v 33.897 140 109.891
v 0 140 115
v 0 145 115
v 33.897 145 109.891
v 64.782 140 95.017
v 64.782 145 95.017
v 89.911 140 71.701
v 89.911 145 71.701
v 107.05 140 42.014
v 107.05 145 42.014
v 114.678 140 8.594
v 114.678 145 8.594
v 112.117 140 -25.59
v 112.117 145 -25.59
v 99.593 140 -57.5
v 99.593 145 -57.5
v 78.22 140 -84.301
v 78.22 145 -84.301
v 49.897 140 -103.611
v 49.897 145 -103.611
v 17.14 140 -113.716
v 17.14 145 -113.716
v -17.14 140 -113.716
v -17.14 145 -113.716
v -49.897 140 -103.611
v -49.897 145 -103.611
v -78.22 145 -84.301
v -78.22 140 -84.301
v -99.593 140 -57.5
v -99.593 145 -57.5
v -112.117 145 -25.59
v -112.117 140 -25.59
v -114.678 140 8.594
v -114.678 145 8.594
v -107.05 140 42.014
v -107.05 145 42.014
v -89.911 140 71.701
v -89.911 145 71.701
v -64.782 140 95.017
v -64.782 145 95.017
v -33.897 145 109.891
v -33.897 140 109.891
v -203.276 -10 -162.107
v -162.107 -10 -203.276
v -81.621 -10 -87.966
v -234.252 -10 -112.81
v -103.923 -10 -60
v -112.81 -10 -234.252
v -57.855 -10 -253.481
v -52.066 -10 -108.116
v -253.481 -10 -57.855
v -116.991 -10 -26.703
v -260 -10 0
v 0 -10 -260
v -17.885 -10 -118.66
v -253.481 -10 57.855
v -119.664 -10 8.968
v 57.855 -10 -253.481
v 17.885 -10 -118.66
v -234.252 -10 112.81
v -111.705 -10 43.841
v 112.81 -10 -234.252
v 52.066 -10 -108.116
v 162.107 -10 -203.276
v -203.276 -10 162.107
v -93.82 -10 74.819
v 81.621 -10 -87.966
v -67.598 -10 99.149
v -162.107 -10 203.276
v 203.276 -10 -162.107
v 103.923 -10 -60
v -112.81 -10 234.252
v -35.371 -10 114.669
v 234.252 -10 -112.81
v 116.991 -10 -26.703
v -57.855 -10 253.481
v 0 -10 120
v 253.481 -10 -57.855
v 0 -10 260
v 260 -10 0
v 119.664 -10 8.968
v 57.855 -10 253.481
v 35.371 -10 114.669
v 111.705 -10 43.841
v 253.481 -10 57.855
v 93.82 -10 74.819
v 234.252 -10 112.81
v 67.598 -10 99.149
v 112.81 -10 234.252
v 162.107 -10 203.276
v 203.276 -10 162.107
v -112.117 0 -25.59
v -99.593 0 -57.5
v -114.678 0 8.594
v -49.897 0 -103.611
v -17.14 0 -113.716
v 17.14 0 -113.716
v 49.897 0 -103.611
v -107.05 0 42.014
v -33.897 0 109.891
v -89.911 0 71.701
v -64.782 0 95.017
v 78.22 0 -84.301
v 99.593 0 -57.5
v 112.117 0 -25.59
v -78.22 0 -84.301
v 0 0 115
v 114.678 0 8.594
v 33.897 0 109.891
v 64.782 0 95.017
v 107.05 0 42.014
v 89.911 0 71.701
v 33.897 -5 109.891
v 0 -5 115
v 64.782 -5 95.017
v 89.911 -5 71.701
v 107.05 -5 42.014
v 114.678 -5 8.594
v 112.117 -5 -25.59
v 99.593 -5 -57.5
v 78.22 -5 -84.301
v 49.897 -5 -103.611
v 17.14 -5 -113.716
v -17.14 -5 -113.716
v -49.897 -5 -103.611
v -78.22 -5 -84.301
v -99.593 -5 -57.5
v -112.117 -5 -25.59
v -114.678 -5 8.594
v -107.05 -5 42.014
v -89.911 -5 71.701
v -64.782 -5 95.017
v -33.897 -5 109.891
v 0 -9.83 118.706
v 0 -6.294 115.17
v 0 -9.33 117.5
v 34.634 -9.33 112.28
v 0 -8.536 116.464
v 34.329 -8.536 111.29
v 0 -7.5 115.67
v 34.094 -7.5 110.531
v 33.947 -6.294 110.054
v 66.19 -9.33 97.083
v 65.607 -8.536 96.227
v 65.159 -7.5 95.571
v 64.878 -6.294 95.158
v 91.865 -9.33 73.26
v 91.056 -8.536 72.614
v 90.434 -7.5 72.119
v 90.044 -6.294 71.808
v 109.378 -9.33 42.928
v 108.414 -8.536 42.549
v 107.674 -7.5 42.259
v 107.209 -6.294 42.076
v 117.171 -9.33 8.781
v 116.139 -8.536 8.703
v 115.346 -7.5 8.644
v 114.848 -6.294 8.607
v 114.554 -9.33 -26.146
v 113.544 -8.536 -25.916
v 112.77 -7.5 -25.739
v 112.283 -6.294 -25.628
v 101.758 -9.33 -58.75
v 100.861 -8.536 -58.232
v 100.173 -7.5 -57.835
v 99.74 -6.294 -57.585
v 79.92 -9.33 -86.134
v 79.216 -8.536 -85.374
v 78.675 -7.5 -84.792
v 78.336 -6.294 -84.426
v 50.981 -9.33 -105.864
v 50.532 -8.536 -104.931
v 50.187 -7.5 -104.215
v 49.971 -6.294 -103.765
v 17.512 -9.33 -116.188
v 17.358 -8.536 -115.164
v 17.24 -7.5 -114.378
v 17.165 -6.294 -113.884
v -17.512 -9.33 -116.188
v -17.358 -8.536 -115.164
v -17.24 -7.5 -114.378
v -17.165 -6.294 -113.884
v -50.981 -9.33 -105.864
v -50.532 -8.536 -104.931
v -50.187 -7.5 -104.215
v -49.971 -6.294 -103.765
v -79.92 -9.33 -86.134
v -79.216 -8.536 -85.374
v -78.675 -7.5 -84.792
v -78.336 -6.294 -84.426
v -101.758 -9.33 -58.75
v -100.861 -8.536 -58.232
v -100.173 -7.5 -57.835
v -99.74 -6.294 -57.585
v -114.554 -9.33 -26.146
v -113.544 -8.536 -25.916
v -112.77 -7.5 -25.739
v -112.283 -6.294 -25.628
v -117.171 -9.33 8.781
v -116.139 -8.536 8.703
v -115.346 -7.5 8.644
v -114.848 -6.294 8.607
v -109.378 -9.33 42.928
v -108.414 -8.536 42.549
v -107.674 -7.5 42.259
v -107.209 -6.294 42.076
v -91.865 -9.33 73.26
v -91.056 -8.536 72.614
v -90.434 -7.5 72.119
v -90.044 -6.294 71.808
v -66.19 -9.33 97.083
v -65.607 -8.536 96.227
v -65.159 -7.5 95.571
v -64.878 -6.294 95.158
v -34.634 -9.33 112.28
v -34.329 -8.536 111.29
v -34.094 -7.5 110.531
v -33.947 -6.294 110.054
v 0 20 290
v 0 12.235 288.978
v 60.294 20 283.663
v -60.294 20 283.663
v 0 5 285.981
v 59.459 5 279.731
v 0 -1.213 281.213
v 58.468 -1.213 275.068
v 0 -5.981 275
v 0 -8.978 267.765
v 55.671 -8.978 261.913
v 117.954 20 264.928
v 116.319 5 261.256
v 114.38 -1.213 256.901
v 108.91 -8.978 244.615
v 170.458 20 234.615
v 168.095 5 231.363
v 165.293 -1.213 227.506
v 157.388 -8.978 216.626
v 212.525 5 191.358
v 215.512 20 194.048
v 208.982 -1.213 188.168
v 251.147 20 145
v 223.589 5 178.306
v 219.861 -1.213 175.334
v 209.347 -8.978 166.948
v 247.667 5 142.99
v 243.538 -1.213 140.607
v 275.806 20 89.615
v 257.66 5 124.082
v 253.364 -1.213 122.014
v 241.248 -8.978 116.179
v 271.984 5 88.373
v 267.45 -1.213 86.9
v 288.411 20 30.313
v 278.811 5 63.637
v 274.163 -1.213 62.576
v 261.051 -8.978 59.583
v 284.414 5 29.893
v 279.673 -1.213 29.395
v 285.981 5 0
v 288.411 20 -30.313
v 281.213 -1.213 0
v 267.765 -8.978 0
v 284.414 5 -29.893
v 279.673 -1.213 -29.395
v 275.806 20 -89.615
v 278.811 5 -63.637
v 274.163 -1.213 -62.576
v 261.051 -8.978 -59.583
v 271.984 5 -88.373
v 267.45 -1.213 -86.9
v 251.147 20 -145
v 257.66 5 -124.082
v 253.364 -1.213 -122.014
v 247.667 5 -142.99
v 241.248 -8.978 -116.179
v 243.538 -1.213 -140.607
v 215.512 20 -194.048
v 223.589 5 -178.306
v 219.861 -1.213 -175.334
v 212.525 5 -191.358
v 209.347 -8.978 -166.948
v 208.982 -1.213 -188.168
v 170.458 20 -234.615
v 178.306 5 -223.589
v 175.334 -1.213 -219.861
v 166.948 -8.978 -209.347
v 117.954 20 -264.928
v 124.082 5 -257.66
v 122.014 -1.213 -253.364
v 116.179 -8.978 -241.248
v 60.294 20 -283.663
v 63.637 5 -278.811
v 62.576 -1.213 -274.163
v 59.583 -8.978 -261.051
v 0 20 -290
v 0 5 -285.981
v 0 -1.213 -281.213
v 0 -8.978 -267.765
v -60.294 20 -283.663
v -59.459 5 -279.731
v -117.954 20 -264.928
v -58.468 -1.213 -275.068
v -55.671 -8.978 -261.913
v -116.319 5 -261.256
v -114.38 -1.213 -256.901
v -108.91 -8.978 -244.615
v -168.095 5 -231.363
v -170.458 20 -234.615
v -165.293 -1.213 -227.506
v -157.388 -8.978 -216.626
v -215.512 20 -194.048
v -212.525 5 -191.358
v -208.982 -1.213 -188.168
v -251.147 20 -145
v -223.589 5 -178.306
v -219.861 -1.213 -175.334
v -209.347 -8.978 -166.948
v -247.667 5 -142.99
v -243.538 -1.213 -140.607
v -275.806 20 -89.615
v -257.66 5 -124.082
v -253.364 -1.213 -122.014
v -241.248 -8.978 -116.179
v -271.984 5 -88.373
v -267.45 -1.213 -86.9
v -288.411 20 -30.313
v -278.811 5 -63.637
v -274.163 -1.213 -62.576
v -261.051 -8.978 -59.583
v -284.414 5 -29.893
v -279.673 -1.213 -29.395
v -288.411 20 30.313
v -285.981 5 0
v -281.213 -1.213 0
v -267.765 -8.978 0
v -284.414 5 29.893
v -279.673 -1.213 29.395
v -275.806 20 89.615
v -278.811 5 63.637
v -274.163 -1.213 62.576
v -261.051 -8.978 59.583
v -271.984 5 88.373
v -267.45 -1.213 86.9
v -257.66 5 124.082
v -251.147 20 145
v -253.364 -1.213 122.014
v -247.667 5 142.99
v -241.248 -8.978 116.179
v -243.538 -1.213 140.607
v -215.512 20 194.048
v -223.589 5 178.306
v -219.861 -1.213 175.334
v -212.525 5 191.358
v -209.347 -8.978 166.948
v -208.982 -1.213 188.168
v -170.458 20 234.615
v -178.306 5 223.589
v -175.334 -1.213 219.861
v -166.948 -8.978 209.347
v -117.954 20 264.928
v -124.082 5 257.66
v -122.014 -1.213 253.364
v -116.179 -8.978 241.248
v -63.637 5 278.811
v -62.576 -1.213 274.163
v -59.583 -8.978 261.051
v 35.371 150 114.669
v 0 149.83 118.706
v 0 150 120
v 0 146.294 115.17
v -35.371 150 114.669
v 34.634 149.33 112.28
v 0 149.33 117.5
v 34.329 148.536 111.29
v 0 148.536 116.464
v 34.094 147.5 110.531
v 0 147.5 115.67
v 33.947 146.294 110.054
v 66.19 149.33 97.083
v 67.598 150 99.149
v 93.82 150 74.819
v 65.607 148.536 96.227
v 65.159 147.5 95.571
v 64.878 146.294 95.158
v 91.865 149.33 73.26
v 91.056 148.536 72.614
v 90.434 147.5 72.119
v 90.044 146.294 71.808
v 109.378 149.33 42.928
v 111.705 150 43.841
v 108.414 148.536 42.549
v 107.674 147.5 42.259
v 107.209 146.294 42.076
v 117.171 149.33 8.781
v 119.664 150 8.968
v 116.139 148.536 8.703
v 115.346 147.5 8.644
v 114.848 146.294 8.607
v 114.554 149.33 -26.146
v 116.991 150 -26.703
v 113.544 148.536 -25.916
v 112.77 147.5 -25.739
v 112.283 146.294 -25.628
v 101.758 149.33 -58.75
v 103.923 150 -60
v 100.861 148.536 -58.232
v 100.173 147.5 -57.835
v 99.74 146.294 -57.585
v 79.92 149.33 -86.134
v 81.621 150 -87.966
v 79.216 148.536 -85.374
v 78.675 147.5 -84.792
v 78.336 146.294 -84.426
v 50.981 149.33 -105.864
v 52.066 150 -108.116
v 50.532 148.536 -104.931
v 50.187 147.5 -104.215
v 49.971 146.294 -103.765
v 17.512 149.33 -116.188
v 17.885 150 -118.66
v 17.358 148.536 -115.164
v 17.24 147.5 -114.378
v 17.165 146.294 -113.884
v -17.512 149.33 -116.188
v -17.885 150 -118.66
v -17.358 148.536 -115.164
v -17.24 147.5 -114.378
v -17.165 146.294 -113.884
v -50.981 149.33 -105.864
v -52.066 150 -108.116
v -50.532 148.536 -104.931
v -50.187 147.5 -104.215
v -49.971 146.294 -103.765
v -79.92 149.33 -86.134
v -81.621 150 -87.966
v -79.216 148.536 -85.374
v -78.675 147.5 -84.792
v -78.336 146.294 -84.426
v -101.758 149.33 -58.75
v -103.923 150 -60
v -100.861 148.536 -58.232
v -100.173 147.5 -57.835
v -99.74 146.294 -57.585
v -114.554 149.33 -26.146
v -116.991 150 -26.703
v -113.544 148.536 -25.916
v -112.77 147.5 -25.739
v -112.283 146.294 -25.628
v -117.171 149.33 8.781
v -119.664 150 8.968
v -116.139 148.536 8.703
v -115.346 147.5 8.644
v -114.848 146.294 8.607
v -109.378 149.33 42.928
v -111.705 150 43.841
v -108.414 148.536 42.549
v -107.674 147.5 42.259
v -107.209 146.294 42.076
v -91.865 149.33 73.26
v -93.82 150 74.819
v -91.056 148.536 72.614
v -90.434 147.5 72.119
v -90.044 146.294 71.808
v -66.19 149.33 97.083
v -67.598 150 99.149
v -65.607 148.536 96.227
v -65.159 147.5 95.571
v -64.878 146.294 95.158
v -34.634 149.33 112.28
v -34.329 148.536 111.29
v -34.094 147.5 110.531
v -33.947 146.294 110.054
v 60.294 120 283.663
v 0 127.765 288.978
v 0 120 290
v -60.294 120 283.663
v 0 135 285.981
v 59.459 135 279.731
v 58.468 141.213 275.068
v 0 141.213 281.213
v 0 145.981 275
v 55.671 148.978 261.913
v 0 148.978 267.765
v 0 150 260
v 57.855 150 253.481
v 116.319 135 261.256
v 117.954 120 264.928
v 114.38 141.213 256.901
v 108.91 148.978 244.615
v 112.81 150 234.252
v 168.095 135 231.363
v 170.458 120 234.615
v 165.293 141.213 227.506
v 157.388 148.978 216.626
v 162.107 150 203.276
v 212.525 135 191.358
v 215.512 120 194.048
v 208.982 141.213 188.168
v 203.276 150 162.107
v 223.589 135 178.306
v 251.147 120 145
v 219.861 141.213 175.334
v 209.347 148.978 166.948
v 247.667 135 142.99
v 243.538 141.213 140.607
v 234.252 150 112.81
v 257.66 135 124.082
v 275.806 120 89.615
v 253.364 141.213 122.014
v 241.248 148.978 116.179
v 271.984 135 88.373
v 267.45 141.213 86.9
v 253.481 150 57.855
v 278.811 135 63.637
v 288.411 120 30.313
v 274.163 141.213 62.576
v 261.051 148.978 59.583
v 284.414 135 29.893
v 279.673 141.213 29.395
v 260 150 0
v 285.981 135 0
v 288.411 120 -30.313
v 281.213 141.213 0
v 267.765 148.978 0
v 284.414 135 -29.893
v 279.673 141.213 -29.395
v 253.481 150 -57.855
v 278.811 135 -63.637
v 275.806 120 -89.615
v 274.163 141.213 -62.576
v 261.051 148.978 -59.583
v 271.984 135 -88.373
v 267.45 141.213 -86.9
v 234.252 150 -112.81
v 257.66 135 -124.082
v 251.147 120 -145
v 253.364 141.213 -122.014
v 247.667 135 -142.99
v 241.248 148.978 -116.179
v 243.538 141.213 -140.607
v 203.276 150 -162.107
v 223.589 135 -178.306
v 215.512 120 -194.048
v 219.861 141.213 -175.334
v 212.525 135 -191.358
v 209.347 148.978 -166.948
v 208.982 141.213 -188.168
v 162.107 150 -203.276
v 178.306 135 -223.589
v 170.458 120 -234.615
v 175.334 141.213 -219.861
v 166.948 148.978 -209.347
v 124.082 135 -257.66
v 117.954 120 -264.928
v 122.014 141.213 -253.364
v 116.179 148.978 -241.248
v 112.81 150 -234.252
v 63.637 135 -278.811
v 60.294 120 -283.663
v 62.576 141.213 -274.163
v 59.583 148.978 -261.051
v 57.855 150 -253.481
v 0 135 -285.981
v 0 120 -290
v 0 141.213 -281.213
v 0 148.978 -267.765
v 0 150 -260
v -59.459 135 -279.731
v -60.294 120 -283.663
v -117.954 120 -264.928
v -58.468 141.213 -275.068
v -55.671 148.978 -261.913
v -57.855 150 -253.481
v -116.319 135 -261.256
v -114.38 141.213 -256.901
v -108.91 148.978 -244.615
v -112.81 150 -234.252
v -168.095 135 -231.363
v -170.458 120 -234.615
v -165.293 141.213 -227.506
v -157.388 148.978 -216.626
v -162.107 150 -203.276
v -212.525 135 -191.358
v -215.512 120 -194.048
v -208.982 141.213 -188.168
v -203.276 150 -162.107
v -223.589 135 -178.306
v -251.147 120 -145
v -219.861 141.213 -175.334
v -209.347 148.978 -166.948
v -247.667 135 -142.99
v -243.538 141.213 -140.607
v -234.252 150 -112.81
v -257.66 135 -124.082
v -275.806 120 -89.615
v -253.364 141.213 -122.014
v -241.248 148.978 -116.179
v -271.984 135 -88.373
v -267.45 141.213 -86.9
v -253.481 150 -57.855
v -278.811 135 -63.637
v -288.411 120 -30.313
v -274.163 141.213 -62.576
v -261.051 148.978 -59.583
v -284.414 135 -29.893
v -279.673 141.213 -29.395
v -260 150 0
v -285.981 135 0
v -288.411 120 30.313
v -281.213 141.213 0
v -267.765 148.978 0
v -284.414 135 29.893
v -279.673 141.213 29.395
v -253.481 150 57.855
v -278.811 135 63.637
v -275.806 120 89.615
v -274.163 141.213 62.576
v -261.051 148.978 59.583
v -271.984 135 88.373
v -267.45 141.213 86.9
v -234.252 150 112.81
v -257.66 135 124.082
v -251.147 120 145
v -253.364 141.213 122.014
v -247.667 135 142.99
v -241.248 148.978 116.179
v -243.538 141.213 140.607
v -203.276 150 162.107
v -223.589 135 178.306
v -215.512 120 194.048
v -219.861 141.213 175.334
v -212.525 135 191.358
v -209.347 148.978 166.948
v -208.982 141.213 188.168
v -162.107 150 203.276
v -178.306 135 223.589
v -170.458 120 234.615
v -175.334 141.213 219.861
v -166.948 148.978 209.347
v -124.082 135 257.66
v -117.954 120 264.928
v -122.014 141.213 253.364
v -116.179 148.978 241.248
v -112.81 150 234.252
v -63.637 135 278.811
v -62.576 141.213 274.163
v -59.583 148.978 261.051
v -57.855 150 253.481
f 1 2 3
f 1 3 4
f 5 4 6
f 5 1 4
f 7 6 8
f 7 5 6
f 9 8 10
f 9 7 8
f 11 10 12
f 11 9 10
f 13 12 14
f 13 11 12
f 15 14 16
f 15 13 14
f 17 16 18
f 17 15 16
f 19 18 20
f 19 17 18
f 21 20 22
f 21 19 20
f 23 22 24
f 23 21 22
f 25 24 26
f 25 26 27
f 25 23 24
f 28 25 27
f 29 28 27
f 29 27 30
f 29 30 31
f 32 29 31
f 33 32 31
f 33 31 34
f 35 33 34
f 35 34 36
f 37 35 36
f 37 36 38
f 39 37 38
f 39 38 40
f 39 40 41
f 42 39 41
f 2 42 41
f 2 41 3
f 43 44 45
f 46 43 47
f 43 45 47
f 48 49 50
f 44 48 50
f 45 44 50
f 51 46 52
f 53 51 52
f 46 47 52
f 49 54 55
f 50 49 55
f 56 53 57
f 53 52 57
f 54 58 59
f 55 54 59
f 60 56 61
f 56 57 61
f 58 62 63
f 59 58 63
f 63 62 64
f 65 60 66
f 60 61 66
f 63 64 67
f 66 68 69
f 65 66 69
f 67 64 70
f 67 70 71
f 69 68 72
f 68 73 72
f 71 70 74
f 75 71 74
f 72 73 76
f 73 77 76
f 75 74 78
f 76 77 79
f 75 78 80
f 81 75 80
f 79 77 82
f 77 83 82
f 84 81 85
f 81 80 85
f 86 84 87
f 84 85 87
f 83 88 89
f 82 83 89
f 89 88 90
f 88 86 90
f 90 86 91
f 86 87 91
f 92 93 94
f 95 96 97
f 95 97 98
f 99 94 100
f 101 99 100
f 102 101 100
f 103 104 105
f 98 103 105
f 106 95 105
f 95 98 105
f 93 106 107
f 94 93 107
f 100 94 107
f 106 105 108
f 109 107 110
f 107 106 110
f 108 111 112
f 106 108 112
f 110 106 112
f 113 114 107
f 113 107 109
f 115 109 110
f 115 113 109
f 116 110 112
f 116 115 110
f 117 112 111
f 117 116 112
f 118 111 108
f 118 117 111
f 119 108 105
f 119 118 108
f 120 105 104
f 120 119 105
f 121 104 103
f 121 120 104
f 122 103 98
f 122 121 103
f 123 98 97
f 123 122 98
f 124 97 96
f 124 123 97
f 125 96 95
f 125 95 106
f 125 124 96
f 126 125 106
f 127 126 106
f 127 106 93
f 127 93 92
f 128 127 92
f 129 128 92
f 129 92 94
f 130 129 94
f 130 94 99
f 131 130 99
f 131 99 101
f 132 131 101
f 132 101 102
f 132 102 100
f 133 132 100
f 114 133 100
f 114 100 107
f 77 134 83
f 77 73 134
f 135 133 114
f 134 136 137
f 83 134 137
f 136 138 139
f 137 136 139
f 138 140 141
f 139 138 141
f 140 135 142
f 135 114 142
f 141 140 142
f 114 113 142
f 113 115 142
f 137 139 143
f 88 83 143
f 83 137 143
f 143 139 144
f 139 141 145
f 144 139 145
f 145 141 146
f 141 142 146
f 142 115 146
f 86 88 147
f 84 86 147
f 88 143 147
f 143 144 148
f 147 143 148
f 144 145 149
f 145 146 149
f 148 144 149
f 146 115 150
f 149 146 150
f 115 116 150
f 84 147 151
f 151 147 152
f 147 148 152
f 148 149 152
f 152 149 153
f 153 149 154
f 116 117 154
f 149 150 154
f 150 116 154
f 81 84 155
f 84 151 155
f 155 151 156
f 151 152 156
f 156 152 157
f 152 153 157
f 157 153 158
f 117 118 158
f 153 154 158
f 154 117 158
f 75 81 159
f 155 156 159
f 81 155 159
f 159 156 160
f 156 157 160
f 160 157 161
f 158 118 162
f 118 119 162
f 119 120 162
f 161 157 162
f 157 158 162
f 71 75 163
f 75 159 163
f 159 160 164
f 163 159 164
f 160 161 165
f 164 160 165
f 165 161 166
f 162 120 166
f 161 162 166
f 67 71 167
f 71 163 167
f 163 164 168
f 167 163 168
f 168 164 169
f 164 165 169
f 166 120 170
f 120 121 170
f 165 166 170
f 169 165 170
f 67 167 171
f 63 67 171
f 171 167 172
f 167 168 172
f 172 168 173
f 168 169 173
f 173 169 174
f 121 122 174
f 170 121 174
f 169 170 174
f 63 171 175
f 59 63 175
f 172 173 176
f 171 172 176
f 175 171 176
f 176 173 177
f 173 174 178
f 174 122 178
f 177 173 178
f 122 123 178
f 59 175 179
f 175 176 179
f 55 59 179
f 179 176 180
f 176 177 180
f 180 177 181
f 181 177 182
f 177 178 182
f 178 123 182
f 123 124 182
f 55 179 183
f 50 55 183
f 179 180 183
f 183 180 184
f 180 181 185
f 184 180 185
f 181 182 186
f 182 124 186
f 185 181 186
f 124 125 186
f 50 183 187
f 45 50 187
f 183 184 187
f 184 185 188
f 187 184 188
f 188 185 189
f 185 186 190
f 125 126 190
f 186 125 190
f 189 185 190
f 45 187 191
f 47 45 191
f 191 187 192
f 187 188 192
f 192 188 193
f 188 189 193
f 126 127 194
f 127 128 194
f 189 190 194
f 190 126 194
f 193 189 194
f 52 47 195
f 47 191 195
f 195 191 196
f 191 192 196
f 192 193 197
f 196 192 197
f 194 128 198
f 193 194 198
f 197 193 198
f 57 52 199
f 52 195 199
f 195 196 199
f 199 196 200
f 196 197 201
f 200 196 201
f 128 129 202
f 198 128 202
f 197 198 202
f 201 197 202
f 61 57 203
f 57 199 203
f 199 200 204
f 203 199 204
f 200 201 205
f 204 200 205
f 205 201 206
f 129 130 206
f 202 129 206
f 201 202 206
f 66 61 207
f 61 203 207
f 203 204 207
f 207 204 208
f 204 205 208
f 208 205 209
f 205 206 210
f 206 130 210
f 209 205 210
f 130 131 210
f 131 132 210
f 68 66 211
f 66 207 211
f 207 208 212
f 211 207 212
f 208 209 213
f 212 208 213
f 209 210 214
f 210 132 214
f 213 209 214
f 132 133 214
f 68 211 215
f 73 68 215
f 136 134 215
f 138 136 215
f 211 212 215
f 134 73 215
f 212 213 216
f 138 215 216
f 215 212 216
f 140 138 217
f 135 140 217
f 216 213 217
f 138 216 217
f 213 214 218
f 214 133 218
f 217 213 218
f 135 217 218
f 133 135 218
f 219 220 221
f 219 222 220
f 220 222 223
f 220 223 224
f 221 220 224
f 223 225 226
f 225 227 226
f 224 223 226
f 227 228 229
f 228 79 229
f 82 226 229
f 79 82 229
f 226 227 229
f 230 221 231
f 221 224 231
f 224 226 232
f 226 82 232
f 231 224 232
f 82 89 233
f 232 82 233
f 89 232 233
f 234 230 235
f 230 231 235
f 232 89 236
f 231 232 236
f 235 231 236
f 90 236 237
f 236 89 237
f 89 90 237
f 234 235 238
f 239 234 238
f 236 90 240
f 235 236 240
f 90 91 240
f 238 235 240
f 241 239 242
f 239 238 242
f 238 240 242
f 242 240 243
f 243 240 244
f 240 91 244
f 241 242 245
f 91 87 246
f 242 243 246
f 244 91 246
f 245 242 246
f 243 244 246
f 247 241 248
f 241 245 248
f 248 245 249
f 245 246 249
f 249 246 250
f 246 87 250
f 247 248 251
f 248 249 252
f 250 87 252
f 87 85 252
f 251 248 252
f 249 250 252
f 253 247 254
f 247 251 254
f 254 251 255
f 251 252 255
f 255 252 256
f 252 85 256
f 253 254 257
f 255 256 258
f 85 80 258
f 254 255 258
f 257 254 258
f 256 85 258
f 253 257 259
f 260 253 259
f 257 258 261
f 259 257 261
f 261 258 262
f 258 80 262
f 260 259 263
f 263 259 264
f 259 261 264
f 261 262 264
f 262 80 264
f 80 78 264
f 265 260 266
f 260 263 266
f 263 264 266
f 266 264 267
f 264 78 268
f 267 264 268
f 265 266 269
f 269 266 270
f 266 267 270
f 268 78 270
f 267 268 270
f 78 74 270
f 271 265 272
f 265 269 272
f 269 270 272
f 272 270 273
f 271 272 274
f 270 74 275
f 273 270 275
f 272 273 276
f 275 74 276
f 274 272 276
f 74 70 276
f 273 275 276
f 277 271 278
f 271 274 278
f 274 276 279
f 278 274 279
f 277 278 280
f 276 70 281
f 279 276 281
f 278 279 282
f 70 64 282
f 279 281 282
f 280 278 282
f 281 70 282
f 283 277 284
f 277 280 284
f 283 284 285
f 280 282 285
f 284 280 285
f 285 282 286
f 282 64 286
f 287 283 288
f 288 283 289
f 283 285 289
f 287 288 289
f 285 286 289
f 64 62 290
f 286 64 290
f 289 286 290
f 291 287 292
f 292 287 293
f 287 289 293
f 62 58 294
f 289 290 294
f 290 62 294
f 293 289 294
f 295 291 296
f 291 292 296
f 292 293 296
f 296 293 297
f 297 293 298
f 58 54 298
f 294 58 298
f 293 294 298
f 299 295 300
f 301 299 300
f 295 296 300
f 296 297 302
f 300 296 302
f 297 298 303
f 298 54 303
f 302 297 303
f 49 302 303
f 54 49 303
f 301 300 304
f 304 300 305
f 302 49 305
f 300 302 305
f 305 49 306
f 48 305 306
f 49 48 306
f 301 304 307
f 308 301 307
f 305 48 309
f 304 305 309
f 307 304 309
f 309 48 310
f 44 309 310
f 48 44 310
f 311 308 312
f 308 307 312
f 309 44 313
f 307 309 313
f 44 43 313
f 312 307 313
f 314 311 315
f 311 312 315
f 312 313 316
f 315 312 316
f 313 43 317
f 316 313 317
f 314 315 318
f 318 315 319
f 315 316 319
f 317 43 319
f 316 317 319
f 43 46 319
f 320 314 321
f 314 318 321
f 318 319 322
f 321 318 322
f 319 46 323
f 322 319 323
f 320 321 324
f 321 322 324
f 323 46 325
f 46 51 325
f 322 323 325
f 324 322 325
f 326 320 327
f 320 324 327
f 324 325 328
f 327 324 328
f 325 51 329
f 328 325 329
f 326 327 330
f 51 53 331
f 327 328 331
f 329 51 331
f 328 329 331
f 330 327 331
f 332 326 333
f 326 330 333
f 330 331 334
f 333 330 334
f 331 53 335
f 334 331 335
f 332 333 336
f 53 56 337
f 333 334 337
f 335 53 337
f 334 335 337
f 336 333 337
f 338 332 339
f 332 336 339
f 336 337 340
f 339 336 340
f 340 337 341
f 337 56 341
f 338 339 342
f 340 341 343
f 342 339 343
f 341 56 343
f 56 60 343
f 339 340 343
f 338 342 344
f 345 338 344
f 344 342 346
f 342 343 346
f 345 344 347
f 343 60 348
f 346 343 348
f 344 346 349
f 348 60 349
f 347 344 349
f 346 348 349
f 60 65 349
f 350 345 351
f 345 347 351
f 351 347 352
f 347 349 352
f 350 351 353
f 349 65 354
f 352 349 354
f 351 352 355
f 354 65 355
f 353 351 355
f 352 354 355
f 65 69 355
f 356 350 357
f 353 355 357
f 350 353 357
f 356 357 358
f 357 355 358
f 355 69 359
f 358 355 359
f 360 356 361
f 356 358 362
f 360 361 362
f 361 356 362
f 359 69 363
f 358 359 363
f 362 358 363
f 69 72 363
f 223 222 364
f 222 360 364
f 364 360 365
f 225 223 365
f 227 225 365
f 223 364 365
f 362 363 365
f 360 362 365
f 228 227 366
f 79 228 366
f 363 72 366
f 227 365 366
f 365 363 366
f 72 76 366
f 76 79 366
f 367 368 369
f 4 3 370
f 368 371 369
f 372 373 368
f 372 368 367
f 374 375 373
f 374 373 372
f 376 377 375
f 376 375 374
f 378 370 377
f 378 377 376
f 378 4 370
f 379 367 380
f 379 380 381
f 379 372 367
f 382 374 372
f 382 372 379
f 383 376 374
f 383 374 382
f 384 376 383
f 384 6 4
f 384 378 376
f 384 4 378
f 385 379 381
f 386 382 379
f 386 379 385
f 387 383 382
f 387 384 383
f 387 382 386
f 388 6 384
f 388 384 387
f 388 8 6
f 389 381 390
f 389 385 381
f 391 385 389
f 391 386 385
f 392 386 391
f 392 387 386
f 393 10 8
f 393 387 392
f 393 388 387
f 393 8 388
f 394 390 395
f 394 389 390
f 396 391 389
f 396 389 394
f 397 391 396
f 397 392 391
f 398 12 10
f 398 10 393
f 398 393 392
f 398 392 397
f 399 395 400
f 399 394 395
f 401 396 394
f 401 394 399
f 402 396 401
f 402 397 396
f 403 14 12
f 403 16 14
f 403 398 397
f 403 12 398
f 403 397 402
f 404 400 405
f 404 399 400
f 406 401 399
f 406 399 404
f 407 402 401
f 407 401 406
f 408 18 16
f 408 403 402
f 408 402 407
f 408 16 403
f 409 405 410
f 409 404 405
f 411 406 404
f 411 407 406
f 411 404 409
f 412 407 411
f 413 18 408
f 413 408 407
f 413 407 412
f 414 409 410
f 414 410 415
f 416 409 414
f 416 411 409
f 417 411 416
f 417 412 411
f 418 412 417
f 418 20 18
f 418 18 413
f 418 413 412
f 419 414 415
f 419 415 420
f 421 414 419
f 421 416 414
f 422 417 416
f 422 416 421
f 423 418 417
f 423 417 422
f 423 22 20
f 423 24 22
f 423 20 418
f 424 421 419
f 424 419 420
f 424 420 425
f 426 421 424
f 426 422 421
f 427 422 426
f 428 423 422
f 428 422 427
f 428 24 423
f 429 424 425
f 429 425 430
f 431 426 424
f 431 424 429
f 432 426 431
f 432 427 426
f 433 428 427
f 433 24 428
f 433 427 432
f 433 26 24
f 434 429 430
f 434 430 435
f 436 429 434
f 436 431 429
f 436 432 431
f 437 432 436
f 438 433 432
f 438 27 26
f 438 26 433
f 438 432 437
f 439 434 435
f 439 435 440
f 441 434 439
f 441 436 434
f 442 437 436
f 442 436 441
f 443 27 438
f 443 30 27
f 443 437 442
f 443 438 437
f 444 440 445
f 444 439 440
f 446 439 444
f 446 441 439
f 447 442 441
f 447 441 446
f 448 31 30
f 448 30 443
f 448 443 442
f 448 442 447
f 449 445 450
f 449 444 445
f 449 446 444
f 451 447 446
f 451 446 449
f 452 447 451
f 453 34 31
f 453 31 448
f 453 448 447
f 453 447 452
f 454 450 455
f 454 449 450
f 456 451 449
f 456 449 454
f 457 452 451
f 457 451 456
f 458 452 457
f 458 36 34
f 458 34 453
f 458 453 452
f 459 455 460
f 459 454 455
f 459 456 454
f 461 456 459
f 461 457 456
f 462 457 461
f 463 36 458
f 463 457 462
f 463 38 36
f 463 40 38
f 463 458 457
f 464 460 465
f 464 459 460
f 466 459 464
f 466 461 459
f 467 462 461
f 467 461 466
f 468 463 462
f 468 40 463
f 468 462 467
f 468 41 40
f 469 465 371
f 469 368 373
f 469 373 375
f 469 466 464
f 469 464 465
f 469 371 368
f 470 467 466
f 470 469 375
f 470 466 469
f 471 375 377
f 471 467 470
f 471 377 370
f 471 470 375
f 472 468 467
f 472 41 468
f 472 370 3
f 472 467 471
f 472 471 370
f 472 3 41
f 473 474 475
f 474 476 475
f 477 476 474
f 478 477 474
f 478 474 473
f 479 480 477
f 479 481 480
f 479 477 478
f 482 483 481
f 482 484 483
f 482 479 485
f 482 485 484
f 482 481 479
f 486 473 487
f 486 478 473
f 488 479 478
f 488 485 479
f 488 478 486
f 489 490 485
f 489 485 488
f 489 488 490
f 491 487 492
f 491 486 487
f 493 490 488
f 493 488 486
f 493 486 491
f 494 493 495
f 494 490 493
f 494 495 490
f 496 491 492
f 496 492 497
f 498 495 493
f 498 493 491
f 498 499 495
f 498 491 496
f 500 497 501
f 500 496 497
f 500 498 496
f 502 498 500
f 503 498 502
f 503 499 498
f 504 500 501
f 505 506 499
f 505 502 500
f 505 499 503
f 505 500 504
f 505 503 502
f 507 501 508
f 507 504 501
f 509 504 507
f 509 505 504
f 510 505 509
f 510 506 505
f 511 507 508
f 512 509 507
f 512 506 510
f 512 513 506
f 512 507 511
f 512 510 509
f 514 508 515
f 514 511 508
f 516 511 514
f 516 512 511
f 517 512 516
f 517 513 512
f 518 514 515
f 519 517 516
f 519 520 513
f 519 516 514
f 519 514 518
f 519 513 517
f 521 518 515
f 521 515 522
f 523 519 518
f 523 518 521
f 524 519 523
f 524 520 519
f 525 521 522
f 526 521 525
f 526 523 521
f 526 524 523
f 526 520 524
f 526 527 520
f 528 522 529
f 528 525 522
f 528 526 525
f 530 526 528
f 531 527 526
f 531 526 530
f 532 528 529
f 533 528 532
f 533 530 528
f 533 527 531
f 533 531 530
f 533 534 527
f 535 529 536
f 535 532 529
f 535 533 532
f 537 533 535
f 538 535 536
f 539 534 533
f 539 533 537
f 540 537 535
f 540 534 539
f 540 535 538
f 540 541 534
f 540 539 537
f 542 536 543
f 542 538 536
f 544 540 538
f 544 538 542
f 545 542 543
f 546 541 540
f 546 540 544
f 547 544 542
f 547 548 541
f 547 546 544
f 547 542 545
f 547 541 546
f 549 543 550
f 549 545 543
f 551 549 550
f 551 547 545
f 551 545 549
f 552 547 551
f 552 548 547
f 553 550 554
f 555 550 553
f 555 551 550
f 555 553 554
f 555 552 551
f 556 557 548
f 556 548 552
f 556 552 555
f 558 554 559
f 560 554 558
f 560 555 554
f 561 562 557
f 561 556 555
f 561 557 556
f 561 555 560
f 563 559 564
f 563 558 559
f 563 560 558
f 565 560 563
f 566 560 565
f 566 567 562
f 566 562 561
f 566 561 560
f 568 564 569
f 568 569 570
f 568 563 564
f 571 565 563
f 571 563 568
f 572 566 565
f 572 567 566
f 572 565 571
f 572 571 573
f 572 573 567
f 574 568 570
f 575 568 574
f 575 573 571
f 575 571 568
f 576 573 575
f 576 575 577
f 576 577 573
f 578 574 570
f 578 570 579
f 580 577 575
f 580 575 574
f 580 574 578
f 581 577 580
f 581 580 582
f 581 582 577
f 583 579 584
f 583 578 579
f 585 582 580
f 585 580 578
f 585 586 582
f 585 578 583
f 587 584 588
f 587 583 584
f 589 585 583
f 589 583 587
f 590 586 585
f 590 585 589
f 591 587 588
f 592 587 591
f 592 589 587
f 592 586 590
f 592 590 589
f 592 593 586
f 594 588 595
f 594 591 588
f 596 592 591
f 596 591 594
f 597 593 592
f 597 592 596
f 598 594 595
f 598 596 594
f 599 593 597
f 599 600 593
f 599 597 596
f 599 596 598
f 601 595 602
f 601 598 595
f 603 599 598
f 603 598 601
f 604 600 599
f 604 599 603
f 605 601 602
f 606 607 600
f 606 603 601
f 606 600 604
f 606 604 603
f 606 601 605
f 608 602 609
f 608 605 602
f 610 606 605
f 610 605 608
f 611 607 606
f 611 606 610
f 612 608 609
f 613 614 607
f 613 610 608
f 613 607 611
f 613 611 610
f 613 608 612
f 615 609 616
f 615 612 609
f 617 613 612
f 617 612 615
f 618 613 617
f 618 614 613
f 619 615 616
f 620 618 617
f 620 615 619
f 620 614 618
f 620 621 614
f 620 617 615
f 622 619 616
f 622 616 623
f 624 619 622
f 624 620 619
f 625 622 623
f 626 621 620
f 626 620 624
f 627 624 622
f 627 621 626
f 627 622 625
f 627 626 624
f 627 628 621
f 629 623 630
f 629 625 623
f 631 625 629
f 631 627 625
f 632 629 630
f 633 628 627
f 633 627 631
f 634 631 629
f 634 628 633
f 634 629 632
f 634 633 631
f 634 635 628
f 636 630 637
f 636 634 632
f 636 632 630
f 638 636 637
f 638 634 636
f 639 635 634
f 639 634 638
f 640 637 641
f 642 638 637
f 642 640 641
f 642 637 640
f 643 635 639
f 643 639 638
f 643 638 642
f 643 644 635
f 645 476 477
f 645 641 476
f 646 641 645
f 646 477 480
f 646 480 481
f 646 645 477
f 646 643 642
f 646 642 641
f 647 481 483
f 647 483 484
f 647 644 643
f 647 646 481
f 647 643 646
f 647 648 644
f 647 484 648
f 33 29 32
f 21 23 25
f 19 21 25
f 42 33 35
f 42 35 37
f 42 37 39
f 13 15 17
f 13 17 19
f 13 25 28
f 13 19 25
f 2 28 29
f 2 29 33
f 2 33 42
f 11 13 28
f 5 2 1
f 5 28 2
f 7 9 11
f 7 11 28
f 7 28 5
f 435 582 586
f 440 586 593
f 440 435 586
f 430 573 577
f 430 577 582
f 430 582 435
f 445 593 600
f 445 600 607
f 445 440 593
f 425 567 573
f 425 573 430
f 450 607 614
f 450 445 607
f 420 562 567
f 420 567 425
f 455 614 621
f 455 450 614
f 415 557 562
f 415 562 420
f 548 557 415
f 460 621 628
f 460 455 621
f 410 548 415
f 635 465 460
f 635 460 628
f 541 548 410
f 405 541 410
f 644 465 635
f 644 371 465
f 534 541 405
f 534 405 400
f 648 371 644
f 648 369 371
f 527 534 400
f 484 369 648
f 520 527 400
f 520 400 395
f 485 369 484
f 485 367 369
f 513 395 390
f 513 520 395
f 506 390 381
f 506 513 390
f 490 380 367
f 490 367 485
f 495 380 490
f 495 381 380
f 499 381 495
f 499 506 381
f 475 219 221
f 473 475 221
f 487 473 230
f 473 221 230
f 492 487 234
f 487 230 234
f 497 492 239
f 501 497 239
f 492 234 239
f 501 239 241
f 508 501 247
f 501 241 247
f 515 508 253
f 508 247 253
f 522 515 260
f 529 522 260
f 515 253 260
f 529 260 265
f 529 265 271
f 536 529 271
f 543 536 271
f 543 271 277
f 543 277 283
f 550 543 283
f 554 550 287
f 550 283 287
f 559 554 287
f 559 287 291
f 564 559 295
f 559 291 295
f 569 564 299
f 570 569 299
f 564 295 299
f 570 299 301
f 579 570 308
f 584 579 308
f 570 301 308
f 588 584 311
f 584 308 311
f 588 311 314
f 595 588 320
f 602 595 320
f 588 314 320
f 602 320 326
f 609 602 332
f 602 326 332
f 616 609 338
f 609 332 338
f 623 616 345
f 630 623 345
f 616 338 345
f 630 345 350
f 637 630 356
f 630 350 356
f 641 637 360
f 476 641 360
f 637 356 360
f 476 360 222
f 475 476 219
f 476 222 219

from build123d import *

# Parameters (mm, degrees)
CROQUIS1_R                   = 115
SALIENTE_EXTRUIR1_DEPTH      = 140
SALIENTE_EXTRUIR2_DEPTH      = 80
SALIENTE_EXTRUIR2_DEPTH_BACK = 80
CROQUIS2_R                   = 290
CROQUIS2_R_2                 = 115
REDONDEO1_R                  = 30
REDONDEO2_R                  = 5
REDONDEO3_R                  = 5


with BuildPart() as part:
    # Croquis1 → Saliente-Extruir1 (new body)
    with BuildSketch(Plane(origin=(0, 0, 0), x_dir=(1, 0, 0), z_dir=(0, 1, 0))):
        with Locations(Location((0, 0, 0), (0, 0, 270))):
            Circle(CROQUIS1_R)
    extrude(amount=SALIENTE_EXTRUIR1_DEPTH)

    # Croquis2 → Saliente-Extruir2 (add, two sides: drawn at the far end of the back side and taken through both)
    with BuildSketch(Plane(origin=(0, 70, 0), x_dir=(1, 0, 0), z_dir=(0, 1, 0)).offset(-SALIENTE_EXTRUIR2_DEPTH_BACK)):
        with Locations(Location((0, 0, 0), (0, 0, 270))):
            Circle(CROQUIS2_R)
        with Locations(Location((0, 0, 0), (0, 0, 270))):
            Circle(CROQUIS2_R_2, mode=Mode.SUBTRACT)
    extrude(amount=SALIENTE_EXTRUIR2_DEPTH + SALIENTE_EXTRUIR2_DEPTH_BACK)

    # Redondeo1
    redondeo1_edges = [part.edges().sort_by_distance(p)[0] for p in [
        (0, -10, -290),
        (0, 150, -290),
    ]]
    fillet(redondeo1_edges, radius=REDONDEO1_R)

    # Redondeo2
    redondeo2_edges = [part.edges().sort_by_distance(p)[0] for p in [
        (0, -10, -115),
    ]]
    fillet(redondeo2_edges, radius=REDONDEO2_R)

    # Redondeo3
    redondeo3_edges = [part.edges().sort_by_distance(p)[0] for p in [
        (0, 150, -115),
    ]]
    fillet(redondeo3_edges, radius=REDONDEO3_R)


solid = part.part
